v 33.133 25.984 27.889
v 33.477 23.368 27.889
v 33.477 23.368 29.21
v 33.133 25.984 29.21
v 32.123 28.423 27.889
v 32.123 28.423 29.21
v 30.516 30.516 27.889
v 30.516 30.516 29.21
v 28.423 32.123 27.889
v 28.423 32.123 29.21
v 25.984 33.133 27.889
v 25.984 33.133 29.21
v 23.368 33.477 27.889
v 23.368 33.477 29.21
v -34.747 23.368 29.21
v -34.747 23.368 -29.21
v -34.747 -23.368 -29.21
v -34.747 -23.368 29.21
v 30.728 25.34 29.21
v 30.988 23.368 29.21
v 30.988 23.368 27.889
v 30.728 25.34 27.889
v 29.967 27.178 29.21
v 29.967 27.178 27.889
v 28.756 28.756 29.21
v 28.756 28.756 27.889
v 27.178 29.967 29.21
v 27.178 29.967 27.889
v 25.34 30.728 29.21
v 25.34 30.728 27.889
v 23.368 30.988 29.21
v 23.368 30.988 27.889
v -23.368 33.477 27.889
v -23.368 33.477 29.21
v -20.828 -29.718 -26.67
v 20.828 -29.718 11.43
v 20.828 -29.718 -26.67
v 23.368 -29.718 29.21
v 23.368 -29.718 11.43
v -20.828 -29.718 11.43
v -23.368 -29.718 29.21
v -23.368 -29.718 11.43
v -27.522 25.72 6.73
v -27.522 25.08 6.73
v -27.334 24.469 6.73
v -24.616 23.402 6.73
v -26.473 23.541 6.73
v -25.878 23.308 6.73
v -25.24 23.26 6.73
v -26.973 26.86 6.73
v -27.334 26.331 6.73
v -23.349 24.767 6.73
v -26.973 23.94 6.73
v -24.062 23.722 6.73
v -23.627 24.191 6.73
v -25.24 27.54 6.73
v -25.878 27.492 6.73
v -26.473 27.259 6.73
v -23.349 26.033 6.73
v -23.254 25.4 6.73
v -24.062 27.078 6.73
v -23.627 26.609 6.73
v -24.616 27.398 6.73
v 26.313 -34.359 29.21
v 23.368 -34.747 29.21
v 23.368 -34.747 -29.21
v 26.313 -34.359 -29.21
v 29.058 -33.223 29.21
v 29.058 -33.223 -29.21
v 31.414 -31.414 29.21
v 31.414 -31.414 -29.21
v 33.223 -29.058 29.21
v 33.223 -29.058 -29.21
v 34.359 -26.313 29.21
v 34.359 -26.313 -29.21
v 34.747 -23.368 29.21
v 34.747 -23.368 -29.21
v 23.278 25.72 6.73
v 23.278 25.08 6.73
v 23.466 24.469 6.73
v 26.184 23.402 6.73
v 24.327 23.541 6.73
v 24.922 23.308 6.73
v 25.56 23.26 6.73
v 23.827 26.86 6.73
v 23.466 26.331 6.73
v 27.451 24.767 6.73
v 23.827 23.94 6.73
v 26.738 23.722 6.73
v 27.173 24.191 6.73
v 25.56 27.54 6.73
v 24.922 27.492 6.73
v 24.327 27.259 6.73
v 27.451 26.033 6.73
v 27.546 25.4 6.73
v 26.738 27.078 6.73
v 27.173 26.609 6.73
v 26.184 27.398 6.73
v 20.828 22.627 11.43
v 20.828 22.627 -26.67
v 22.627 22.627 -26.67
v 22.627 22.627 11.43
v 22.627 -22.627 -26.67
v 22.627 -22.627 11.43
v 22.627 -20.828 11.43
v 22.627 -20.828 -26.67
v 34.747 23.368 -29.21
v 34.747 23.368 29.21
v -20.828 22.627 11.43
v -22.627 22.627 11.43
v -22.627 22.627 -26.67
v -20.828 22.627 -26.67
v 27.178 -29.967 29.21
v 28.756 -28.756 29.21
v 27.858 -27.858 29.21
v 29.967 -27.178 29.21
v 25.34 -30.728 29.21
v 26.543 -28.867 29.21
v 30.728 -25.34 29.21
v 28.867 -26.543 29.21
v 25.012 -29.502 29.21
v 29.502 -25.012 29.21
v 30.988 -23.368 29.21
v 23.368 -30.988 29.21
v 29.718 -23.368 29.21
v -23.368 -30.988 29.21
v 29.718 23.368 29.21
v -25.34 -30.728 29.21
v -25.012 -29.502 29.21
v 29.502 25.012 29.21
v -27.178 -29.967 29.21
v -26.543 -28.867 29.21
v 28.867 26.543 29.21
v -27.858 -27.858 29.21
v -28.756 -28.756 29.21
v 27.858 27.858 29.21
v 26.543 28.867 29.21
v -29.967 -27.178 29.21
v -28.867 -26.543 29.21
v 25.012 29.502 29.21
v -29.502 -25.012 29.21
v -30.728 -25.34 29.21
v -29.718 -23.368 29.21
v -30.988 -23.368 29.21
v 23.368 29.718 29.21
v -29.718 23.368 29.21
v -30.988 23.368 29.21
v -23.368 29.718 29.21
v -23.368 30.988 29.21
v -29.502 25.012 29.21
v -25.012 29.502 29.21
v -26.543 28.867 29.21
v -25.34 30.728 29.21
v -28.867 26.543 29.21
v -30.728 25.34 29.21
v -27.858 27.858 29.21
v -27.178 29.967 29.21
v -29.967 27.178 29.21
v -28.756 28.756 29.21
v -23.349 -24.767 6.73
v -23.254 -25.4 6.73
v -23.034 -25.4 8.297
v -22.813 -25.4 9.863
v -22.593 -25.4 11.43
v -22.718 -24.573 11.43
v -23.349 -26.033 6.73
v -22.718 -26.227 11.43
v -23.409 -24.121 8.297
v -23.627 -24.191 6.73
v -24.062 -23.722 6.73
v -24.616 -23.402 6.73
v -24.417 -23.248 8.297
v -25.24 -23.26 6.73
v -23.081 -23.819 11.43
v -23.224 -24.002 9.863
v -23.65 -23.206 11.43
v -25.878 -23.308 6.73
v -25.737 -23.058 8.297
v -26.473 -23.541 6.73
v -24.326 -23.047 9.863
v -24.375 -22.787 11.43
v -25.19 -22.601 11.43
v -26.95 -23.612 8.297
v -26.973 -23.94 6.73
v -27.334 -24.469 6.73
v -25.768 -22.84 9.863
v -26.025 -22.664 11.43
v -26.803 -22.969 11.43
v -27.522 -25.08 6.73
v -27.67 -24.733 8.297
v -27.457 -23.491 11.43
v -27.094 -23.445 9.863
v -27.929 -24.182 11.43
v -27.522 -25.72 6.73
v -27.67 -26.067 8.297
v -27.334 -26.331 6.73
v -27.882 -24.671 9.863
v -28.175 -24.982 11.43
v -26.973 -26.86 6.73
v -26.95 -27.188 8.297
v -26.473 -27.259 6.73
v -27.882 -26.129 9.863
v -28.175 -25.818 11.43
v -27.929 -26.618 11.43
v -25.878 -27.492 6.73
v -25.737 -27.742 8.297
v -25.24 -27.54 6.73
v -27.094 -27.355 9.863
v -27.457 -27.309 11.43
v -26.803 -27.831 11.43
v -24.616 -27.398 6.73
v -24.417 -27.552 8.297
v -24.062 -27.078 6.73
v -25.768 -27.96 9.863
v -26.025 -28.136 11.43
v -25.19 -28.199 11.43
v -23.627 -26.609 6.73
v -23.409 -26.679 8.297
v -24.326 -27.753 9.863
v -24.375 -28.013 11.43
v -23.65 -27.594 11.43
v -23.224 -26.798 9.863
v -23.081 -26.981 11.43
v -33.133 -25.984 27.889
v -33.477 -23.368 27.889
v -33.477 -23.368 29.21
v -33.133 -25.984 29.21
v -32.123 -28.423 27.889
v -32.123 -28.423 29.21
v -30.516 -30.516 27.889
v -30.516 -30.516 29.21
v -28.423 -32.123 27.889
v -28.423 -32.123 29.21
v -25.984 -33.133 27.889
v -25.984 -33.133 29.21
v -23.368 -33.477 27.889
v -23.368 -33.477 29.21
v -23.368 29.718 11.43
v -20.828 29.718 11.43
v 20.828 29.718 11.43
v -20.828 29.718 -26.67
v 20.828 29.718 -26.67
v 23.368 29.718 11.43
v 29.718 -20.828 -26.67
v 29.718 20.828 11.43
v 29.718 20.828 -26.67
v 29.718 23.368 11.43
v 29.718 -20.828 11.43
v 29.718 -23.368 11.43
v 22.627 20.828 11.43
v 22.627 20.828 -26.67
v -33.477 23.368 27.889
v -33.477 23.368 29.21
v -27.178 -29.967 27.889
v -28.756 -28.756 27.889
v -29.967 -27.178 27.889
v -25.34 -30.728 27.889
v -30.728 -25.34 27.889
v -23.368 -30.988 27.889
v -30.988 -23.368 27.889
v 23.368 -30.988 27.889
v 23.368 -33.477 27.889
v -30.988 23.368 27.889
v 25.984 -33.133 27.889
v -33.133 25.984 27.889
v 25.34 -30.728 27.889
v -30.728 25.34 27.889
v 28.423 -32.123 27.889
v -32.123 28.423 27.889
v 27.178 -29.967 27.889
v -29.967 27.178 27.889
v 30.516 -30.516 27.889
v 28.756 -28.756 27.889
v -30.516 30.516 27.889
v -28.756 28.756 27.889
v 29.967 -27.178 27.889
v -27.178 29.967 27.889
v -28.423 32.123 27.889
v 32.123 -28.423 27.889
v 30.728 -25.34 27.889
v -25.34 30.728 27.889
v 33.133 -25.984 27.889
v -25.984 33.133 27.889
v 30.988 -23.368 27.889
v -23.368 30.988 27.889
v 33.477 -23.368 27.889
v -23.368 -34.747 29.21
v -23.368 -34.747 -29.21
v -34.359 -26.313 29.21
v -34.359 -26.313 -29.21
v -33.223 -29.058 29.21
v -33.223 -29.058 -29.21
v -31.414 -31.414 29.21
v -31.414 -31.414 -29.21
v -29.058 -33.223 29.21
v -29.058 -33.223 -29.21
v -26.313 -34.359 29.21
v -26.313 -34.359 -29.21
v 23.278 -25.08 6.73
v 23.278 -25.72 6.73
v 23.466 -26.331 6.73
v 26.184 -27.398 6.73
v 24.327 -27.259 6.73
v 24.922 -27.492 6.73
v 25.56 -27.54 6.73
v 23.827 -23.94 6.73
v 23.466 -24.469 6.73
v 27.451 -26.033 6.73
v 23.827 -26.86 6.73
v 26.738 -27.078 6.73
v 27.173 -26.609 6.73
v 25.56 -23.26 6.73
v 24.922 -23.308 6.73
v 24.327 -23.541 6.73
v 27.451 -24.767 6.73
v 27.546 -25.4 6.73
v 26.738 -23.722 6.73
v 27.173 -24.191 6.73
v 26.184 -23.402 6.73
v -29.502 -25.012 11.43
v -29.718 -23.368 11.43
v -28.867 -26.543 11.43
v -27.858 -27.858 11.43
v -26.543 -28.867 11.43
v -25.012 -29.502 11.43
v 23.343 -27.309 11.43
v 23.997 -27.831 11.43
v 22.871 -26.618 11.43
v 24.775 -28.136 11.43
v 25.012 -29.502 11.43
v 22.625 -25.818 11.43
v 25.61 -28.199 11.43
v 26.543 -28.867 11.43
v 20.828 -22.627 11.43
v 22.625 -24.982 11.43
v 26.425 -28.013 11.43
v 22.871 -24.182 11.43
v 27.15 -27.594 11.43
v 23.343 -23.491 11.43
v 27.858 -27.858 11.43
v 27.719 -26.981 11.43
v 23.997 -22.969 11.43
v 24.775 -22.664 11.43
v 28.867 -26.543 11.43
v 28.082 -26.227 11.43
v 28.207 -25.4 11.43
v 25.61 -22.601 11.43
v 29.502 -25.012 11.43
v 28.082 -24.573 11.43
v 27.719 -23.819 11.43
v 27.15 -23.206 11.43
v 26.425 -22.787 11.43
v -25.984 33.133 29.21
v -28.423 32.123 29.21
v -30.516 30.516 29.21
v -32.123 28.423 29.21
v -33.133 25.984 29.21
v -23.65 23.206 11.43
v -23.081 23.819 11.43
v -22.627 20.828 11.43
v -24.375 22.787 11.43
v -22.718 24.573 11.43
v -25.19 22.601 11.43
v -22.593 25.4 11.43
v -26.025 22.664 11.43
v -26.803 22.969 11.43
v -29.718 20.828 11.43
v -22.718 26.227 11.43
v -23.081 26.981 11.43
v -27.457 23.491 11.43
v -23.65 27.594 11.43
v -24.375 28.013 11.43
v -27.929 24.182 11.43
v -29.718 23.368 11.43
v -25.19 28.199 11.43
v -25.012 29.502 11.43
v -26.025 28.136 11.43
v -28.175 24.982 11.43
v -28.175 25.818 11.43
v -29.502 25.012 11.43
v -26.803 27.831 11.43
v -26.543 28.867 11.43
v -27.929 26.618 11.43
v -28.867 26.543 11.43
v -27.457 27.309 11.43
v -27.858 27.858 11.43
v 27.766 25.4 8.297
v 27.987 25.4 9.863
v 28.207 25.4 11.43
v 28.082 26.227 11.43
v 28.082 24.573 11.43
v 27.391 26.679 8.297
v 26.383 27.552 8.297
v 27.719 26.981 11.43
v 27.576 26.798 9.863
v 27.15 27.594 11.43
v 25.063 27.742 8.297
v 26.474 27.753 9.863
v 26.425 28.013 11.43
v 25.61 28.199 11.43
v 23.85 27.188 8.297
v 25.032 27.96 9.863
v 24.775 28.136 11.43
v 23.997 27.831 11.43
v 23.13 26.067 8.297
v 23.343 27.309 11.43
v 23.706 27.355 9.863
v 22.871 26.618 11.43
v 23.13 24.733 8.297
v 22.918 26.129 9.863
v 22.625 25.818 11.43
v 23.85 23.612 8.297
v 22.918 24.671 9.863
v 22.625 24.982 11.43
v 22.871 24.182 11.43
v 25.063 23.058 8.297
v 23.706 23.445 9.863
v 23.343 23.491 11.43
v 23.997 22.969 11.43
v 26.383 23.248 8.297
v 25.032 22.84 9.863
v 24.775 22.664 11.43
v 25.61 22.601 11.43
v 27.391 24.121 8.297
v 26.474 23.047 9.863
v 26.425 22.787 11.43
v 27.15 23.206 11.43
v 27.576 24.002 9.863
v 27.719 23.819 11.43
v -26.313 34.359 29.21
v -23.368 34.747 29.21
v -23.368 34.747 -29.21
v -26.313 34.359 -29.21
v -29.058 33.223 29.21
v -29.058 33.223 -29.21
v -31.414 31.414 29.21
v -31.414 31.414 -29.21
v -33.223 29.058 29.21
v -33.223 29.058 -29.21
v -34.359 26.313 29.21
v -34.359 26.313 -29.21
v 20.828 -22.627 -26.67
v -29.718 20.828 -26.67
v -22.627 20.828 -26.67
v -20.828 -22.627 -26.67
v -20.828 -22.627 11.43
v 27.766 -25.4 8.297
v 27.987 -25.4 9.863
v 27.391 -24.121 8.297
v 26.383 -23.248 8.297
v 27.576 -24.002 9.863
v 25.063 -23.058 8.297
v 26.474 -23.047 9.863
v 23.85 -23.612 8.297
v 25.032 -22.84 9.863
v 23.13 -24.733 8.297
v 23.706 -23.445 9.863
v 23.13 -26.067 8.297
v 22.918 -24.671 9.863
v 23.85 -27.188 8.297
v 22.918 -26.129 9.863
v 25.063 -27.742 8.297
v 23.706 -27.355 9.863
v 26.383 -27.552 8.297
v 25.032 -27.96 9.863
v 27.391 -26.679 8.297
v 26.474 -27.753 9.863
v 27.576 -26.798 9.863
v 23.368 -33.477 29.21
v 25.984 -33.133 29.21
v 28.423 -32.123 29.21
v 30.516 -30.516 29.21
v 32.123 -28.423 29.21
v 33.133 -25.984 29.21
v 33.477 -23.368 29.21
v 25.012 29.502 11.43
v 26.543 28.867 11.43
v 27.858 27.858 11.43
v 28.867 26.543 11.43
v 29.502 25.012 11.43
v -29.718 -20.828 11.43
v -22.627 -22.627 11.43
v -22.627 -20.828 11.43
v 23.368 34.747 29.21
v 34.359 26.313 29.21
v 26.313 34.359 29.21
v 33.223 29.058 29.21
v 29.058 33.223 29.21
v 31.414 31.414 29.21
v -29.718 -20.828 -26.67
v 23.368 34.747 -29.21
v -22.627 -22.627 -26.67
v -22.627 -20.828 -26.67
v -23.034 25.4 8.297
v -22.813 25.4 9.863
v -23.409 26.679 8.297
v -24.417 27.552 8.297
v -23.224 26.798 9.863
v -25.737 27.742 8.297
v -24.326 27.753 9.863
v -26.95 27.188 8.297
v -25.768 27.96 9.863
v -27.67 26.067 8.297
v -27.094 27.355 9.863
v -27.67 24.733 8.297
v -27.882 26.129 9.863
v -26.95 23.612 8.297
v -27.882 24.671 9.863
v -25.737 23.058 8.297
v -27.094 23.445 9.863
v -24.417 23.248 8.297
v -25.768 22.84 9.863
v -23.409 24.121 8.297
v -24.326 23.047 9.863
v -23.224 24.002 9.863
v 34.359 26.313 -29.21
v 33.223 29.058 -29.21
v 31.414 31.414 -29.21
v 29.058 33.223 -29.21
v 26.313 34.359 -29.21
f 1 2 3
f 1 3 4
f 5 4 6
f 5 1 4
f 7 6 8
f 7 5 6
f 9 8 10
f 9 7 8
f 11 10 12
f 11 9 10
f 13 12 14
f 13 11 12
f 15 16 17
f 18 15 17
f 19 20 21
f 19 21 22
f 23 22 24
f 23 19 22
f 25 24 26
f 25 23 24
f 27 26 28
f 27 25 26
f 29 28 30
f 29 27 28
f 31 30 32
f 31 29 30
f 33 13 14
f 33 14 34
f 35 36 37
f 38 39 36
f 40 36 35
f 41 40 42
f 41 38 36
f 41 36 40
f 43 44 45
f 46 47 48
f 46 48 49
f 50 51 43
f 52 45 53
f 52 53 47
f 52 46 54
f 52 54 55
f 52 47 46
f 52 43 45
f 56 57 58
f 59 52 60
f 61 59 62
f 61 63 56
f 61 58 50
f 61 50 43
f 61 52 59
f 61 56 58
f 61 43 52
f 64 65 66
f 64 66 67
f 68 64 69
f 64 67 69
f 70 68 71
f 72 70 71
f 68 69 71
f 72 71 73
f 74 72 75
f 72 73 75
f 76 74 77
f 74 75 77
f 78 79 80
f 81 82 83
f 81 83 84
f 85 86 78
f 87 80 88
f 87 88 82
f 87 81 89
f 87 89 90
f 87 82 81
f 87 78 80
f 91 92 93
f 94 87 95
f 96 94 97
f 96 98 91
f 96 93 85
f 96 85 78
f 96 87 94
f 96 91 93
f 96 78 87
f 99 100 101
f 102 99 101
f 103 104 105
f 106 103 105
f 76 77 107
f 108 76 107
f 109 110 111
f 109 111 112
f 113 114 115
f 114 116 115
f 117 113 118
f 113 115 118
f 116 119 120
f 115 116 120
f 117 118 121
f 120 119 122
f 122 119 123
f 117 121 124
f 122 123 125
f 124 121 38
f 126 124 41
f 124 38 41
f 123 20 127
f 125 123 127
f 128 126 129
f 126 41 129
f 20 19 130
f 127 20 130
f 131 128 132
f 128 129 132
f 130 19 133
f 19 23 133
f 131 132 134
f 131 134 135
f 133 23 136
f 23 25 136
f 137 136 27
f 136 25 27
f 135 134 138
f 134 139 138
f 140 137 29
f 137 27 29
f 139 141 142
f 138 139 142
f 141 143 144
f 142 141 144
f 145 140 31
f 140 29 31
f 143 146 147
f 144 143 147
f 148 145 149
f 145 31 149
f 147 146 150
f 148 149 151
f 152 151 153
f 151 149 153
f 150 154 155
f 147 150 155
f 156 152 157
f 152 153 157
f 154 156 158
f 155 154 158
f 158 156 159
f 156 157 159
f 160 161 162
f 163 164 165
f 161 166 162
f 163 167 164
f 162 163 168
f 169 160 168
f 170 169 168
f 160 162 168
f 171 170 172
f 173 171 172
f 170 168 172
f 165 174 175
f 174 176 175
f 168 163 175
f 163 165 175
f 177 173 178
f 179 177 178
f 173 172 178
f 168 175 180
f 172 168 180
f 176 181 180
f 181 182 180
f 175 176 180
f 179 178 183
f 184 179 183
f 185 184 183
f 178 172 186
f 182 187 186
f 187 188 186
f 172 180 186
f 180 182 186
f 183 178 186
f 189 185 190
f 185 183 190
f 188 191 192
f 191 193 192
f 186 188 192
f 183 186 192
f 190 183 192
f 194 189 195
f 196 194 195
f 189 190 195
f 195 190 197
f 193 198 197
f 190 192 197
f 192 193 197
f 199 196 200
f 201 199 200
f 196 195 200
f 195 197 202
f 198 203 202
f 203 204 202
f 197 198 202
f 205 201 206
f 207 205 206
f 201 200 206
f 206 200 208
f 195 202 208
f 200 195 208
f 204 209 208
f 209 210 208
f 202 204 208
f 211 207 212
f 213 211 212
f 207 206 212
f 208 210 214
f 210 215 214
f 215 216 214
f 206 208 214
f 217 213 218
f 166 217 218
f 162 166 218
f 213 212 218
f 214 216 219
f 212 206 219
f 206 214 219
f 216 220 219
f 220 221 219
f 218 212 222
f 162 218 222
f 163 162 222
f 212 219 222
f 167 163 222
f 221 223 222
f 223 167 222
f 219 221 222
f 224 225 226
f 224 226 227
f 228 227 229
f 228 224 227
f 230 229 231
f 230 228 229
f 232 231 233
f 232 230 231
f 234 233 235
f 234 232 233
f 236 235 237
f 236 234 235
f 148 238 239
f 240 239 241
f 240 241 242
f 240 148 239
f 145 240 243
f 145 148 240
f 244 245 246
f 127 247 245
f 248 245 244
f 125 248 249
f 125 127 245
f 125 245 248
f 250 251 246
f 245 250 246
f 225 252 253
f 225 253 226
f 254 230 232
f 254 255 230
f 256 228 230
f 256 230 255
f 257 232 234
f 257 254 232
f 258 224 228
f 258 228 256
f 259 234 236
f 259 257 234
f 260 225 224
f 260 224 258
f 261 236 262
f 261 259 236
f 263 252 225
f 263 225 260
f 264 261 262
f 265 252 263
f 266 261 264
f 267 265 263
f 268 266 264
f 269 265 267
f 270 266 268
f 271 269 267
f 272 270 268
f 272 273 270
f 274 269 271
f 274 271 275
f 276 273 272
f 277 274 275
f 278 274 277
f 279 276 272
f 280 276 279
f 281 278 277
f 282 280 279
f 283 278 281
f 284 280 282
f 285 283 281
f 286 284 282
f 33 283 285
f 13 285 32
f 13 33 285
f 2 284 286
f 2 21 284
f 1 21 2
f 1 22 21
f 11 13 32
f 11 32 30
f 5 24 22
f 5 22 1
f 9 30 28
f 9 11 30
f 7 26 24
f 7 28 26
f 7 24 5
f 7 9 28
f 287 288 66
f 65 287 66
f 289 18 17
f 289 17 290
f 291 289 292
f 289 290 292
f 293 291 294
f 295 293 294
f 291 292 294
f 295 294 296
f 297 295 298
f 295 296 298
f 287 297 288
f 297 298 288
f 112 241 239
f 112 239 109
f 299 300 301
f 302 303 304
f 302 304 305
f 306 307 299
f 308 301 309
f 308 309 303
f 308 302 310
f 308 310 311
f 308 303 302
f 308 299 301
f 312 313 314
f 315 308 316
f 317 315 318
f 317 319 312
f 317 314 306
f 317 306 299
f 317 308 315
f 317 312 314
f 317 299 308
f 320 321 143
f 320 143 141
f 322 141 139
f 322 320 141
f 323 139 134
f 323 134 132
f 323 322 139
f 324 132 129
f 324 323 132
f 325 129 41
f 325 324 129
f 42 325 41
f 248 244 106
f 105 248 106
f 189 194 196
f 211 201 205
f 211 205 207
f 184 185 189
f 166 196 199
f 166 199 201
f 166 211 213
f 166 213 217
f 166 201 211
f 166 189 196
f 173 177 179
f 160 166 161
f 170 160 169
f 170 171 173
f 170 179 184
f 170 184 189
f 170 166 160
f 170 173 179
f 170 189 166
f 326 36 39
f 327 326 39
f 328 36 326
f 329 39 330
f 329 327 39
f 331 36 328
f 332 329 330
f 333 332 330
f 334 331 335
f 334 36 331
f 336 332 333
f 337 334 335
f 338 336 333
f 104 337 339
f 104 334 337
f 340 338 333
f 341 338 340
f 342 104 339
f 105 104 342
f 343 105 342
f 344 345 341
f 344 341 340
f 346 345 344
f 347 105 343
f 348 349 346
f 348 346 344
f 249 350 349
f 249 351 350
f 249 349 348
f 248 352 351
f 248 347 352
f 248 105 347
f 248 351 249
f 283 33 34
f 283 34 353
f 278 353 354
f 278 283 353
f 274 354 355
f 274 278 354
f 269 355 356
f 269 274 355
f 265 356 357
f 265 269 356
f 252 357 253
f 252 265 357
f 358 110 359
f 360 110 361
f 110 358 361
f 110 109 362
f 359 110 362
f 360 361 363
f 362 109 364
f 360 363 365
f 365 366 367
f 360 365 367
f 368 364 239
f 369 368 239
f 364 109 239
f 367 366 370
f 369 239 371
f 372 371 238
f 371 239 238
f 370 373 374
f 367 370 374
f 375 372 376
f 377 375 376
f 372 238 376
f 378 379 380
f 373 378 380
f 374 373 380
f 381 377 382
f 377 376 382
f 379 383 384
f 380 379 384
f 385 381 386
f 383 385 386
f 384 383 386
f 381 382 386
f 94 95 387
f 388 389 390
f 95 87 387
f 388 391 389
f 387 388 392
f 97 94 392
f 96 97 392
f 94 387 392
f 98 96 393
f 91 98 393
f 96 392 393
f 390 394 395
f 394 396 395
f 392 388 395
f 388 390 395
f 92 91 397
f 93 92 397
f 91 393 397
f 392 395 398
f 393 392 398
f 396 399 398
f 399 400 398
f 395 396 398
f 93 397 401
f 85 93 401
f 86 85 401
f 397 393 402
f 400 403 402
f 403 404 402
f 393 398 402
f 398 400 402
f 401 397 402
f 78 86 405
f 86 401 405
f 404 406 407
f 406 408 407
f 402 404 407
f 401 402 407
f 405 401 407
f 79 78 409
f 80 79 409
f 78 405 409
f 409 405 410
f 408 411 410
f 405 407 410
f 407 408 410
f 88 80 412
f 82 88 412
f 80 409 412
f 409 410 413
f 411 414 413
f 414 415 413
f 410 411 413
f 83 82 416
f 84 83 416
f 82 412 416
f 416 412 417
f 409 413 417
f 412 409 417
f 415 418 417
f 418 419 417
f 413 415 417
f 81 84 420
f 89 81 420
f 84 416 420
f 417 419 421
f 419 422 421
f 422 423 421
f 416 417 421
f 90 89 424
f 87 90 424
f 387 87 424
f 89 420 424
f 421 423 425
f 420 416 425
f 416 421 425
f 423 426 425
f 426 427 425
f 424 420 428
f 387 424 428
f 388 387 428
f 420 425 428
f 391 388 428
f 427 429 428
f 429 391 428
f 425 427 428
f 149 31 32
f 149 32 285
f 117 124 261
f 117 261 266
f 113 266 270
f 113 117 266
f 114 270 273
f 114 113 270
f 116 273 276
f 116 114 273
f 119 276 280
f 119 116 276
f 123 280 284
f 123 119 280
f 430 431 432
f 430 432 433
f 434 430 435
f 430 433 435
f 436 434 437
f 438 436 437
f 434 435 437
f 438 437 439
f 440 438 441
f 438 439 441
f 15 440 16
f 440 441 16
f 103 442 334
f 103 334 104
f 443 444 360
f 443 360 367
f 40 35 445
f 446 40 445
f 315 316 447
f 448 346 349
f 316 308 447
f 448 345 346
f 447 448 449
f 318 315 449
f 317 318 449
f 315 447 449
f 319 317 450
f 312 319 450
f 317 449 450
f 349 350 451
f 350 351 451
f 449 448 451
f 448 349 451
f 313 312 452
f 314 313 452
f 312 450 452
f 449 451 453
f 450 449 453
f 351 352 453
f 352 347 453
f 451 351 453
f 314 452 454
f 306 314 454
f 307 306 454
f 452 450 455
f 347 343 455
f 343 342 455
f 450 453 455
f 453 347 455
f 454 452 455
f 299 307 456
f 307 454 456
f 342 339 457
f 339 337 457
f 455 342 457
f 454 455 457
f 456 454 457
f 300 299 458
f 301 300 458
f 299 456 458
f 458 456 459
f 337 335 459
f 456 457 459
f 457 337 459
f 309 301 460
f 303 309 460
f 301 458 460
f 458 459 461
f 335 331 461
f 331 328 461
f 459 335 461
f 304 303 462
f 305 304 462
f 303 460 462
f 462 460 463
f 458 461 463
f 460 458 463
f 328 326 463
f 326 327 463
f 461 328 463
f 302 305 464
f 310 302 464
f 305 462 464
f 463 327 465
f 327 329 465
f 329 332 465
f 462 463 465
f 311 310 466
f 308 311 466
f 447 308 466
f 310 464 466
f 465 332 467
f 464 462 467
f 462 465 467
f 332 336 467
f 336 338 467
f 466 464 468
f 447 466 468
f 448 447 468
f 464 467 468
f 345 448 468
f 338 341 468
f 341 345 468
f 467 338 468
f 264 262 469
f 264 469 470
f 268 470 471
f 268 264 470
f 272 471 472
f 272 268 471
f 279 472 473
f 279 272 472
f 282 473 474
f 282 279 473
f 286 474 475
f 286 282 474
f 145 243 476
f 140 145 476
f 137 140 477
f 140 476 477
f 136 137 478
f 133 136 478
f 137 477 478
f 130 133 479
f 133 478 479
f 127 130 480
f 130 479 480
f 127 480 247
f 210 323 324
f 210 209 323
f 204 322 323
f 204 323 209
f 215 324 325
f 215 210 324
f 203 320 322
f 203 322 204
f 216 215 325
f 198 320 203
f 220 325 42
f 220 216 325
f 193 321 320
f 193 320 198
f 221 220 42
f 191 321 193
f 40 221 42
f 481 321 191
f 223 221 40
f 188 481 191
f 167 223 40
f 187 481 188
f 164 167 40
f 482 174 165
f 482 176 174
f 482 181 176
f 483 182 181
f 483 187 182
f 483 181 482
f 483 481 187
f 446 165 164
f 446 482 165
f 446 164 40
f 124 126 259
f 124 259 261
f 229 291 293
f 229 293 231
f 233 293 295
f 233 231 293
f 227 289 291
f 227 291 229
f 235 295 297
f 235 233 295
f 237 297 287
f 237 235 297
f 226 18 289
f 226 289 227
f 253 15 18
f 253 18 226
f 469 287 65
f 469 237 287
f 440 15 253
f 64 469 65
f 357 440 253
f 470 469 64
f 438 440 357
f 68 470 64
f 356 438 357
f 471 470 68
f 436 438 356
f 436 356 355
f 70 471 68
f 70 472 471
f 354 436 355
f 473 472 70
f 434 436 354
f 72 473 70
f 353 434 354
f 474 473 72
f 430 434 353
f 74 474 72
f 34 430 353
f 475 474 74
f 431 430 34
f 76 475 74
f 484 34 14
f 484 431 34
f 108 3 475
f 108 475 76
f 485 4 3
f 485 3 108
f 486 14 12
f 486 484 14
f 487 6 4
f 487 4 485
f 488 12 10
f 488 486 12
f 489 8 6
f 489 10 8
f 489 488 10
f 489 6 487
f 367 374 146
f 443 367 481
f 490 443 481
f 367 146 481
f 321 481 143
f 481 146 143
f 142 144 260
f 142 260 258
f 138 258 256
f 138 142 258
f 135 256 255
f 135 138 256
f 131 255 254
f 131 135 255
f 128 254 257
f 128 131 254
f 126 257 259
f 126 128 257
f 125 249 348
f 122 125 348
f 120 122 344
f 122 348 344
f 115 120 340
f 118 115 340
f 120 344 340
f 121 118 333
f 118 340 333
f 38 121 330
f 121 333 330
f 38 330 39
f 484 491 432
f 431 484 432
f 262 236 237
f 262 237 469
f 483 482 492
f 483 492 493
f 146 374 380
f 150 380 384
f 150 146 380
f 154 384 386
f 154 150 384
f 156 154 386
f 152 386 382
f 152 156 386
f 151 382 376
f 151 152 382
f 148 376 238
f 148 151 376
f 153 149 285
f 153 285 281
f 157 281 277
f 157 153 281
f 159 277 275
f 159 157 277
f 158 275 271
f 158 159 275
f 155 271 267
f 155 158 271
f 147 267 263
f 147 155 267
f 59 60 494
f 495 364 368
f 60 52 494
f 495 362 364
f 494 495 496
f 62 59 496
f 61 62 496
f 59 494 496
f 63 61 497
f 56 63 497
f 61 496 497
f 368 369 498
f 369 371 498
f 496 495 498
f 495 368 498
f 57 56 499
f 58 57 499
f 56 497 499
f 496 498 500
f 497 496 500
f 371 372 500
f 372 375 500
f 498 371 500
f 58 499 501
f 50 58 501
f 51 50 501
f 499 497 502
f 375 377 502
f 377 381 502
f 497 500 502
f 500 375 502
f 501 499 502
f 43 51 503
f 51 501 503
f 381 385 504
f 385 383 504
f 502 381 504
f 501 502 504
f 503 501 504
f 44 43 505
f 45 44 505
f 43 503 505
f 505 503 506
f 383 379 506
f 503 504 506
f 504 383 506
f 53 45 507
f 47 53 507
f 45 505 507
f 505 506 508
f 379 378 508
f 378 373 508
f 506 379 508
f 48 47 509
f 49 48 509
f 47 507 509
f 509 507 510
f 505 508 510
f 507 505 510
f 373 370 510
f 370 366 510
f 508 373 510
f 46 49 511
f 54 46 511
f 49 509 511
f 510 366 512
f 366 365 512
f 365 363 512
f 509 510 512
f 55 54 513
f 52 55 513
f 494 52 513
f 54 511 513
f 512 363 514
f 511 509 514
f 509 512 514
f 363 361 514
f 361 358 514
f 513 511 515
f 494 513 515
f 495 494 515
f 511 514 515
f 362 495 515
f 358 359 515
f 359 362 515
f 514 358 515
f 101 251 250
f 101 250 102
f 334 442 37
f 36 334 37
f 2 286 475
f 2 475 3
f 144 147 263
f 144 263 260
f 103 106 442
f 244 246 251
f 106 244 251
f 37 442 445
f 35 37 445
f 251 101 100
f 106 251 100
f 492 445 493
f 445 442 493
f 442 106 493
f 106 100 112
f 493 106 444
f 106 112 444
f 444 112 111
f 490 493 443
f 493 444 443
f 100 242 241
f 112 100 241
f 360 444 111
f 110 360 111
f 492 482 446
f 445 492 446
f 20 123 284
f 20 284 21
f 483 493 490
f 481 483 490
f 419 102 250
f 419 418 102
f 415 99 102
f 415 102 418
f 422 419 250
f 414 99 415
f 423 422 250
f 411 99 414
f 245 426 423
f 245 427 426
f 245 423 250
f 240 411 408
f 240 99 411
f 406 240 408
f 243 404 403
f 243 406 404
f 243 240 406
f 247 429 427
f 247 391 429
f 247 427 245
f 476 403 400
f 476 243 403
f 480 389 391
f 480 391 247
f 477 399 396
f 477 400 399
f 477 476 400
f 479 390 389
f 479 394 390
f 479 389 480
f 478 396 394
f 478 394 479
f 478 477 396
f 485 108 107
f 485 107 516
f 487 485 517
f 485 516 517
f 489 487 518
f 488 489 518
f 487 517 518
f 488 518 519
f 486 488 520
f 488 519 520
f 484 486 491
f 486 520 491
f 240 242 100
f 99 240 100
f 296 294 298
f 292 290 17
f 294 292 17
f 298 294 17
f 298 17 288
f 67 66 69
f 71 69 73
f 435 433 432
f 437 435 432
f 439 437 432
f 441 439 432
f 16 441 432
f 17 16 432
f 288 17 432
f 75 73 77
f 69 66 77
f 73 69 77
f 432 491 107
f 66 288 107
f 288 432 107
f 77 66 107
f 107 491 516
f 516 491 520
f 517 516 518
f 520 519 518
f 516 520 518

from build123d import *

# Parameters (mm, degrees)
BOSS_EXTRUDE1_DEPTH          = 29.21
SHELL1_T                     = -2.54
FILLET1_R                    = 6.35
BOSS_EXTRUDE2_DEPTH          = 38.1
SKETCH3_R                    = 2.8067
CUT_EXTRUDE1_DEPTH           = 4.7
CUT_EXTRUDE1_DRAFT           = -8
CUT_EXTRUDE1_PROFILE_2_DEPTH = 4.7
CUT_EXTRUDE1_PROFILE_2_DRAFT = -8
CUT_EXTRUDE1_PROFILE_3_DEPTH = 4.7
CUT_EXTRUDE1_PROFILE_3_DRAFT = -8
CUT_EXTRUDE1_PROFILE_4_DEPTH = 4.7
CUT_EXTRUDE1_PROFILE_4_DRAFT = -8
SKETCH5_W                    = 45.253999916
SKETCH5_H                    = 45.253999916
CUT_EXTRUDE5_DEPTH           = 38.1
SKETCH6_OUTSIDE_W            = 88.184
SKETCH6_OUTSIDE_H            = 88.184
CUT_EXTRUDE6_DEPTH           = 1.3208
BOSS_EXTRUDE3_START          = -2.54
BOSS_EXTRUDE3_DEPTH          = 57.0992
BOSS_EXTRUDE7_START          = -57.0992
BOSS_EXTRUDE7_DEPTH          = 58.42


with BuildPart() as part:
    # Sketch1 → Boss-Extrude1 (new, symmetric)
    with BuildSketch(Plane.XY):
        Polygon((-32.258, -32.258), (-32.258, -11.938), (-32.258, 11.938), (-32.258, 32.258), (32.258, 32.258), (32.258, -32.258), align=None)
    extrude(amount=BOSS_EXTRUDE1_DEPTH, both=True)

    # Shell1
    shell1_openings = [part.faces().sort_by_distance(p)[0] for p in [
        (0, 0, 29.21),
    ]]
    offset(amount=SHELL1_T, openings=shell1_openings, kind=Kind.INTERSECTION)

    # Fillet1
    fillet1_edges = [part.edges().sort_by_distance(p)[0] for p in [
        (-32.258, -32.258, 0),
        (-32.258, 32.258, 0),
        (32.258, 32.258, 0),
        (32.258, -32.258, 0),
        (-29.718, -29.718, 1.27),
        (29.718, -29.718, 1.27),
        (29.718, 29.718, 1.27),
        (-29.718, 29.718, 1.27),
    ]]
    fillet(fillet1_edges, radius=FILLET1_R)

    # Sketch2 → Boss-Extrude2 (add)
    with BuildSketch(Plane.XY.offset(-26.67)):
        with BuildLine():
            Line((-20.828, -20.828), (-29.718, -20.828))
            Line((-29.718, -20.828), (-29.718, -23.368))
            ThreePointArc((-29.718, -23.368), (-27.858128061, -27.858128061), (-23.368, -29.718))
            Line((-23.368, -29.718), (-20.828, -29.718))
            Line((-20.828, -29.718), (-20.828, -20.828))
        make_face()
        with BuildLine():
            ThreePointArc((-29.718, 23.368), (-27.858128061, 27.858128061), (-23.368, 29.718))
            Line((-23.368, 29.718), (-20.828, 29.718))
            Line((-20.828, 29.718), (-20.828, 20.828))
            Line((-20.828, 20.828), (-29.718, 20.828))
            Line((-29.718, 20.828), (-29.718, 23.368))
        make_face()
        with BuildLine():
            ThreePointArc((29.718, 23.368), (27.858128061, 27.858128061), (23.368, 29.718))
            Line((23.368, 29.718), (20.828, 29.718))
            Line((20.828, 29.718), (20.828, 20.828))
            Line((20.828, 20.828), (29.718, 20.828))
            Line((29.718, 20.828), (29.718, 23.368))
        make_face()
        with BuildLine():
            ThreePointArc((23.368, -29.718), (27.858128061, -27.858128061), (29.718, -23.368))
            Line((29.718, -23.368), (29.718, -20.828))
            Line((29.718, -20.828), (20.828, -20.828))
            Line((20.828, -20.828), (20.828, -29.718))
            Line((20.828, -29.718), (23.368, -29.718))
        make_face()
    extrude(amount=BOSS_EXTRUDE2_DEPTH)


with BuildPart() as cut_extrude1_tool:
    # Sketch3 → Cut-Extrude1 (with draft: the straight prism first)
    with BuildSketch(Plane.XY.offset(11.43)):
        with Locations((-25.4, -25.4)):
            Circle(SKETCH3_R)
    extrude(amount=-CUT_EXTRUDE1_DEPTH)
    # Cut-Extrude1: the draft: its side faces are tilted about the plane it starts from
    cut_extrude1_sides = [cut_extrude1_tool.faces().sort_by_distance(p)[0] for p in [
        (-28.2067, -25.4, 9.08),
    ]]
    draft(cut_extrude1_sides, Plane.XY.offset(11.43), CUT_EXTRUDE1_DRAFT)


with BuildPart() as part_1:
    add(part.part)

    # Cut-Extrude1: cut by cut_extrude1_tool
    add(cut_extrude1_tool.part, mode=Mode.SUBTRACT)


with BuildPart() as cut_extrude1_profile_2_tool:
    # Sketch3 → Cut-Extrude1 profile 2 (with draft: the straight prism first)
    with BuildSketch(Plane.XY.offset(11.43)):
        with Locations((-25.4, 25.4)):
            Circle(SKETCH3_R)
    extrude(amount=-CUT_EXTRUDE1_PROFILE_2_DEPTH)
    # Cut-Extrude1 profile 2: the draft: its side faces are tilted about the plane it starts from
    cut_extrude1_profile_2_sides = [cut_extrude1_profile_2_tool.faces().sort_by_distance(p)[0] for p in [
        (-28.2067, 25.4, 9.08),
    ]]
    draft(cut_extrude1_profile_2_sides, Plane.XY.offset(11.43), CUT_EXTRUDE1_PROFILE_2_DRAFT)


with BuildPart() as part_2:
    add(part_1.part)

    # Cut-Extrude1 profile 2: cut by cut_extrude1_profile_2_tool
    add(cut_extrude1_profile_2_tool.part, mode=Mode.SUBTRACT)


with BuildPart() as cut_extrude1_profile_3_tool:
    # Sketch3 → Cut-Extrude1 profile 3 (with draft: the straight prism first)
    with BuildSketch(Plane.XY.offset(11.43)):
        with Locations((25.4, 25.4)):
            Circle(SKETCH3_R)
    extrude(amount=-CUT_EXTRUDE1_PROFILE_3_DEPTH)
    # Cut-Extrude1 profile 3: the draft: its side faces are tilted about the plane it starts from
    cut_extrude1_profile_3_sides = [cut_extrude1_profile_3_tool.faces().sort_by_distance(p)[0] for p in [
        (22.5933, 25.4, 9.08),
    ]]
    draft(cut_extrude1_profile_3_sides, Plane.XY.offset(11.43), CUT_EXTRUDE1_PROFILE_3_DRAFT)


with BuildPart() as part_3:
    add(part_2.part)

    # Cut-Extrude1 profile 3: cut by cut_extrude1_profile_3_tool
    add(cut_extrude1_profile_3_tool.part, mode=Mode.SUBTRACT)


with BuildPart() as cut_extrude1_profile_4_tool:
    # Sketch3 → Cut-Extrude1 profile 4 (with draft: the straight prism first)
    with BuildSketch(Plane.XY.offset(11.43)):
        with Locations((25.4, -25.4)):
            Circle(SKETCH3_R)
    extrude(amount=-CUT_EXTRUDE1_PROFILE_4_DEPTH)
    # Cut-Extrude1 profile 4: the draft: its side faces are tilted about the plane it starts from
    cut_extrude1_profile_4_sides = [cut_extrude1_profile_4_tool.faces().sort_by_distance(p)[0] for p in [
        (22.5933, -25.4, 9.08),
    ]]
    draft(cut_extrude1_profile_4_sides, Plane.XY.offset(11.43), CUT_EXTRUDE1_PROFILE_4_DRAFT)


with BuildPart() as part_4:
    add(part_3.part)

    # Cut-Extrude1 profile 4: cut by cut_extrude1_profile_4_tool
    add(cut_extrude1_profile_4_tool.part, mode=Mode.SUBTRACT)

    # Sketch5 → Cut-Extrude5 (cut)
    with BuildSketch(Plane.XY.offset(11.43)):
        Rectangle(SKETCH5_W, SKETCH5_H)
    extrude(amount=-CUT_EXTRUDE5_DEPTH, mode=Mode.SUBTRACT)

    # Sketch6 outside → Cut-Extrude6 (cut)
    # profile 1 of 2: a face of its own
    with BuildSketch(Plane.XY.offset(29.21)):
        Rectangle(SKETCH6_OUTSIDE_W, SKETCH6_OUTSIDE_H)
        with BuildLine():
            Line((23.368, 30.988), (20.828, 30.988))
            Line((20.828, 30.988), (-20.828, 30.988))
            Line((-20.828, 30.988), (-23.368, 30.988))
            ThreePointArc((-23.368, 30.988), (-28.756153673, 28.756153673), (-30.988, 23.368))
            Line((-30.988, 23.368), (-30.988, -23.368))
            ThreePointArc((-30.988, -23.368), (-28.756153673, -28.756153673), (-23.368, -30.988))
            Line((-23.368, -30.988), (-20.828, -30.988))
            Line((-20.828, -30.988), (20.828, -30.988))
            Line((20.828, -30.988), (23.368, -30.988))
            ThreePointArc((23.368, -30.988), (28.756153673, -28.756153673), (30.988, -23.368))
            Line((30.988, -23.368), (30.988, 23.368))
            ThreePointArc((30.988, 23.368), (28.756153673, 28.756153673), (23.368, 30.988))
        make_face(mode=Mode.SUBTRACT)
    # profile 2 of 2: a face of its own
    with BuildSketch(Plane.XY.offset(29.21)):
        with BuildLine():
            Line((23.368, 29.718), (20.828, 29.718))
            Line((20.828, 29.718), (-20.828, 29.718))
            Line((-20.828, 29.718), (-23.368, 29.718))
            ThreePointArc((-23.368, 29.718), (-27.858128061, 27.858128061), (-29.718, 23.368))
            Line((-29.718, 23.368), (-29.718, -23.368))
            ThreePointArc((-29.718, -23.368), (-27.858128061, -27.858128061), (-23.368, -29.718))
            Line((-23.368, -29.718), (-20.828, -29.718))
            Line((-20.828, -29.718), (20.828, -29.718))
            Line((20.828, -29.718), (23.368, -29.718))
            ThreePointArc((23.368, -29.718), (27.858128061, -27.858128061), (29.718, -23.368))
            Line((29.718, -23.368), (29.718, 23.368))
            ThreePointArc((29.718, 23.368), (27.858128061, 27.858128061), (23.368, 29.718))
        make_face()
    extrude(amount=-CUT_EXTRUDE6_DEPTH, mode=Mode.SUBTRACT)

    # Sketch7 → Boss-Extrude3 (add)
    with BuildSketch(Plane.XY.offset(-26.67).offset(BOSS_EXTRUDE3_START)):
        with BuildLine():
            Line((33.4772, -23.368), (33.4772, 23.368))
            ThreePointArc((33.4772, 23.368), (30.516283872, 30.516283872), (23.368, 33.4772))
            Line((23.368, 33.4772), (-23.368, 33.4772))
            ThreePointArc((-23.368, 33.4772), (-30.516283872, 30.516283872), (-33.4772, 23.368))
            Line((-33.4772, 23.368), (-33.4772, -23.368))
            ThreePointArc((-33.4772, -23.368), (-30.516283872, -30.516283872), (-23.368, -33.4772))
            Line((-23.368, -33.4772), (23.368, -33.4772))
            ThreePointArc((23.368, -33.4772), (30.516283872, -30.516283872), (33.4772, -23.368))
        make_face()
        with BuildLine():
            Line((23.368, 32.2072), (-23.368, 32.2072))
            ThreePointArc((-23.368, 32.2072), (-29.61825826, 29.61825826), (-32.2072, 23.368))
            Line((-32.2072, 23.368), (-32.2072, -23.368))
            ThreePointArc((-32.2072, -23.368), (-29.61825826, -29.61825826), (-23.368, -32.2072))
            Line((-23.368, -32.2072), (23.368, -32.2072))
            ThreePointArc((23.368, -32.2072), (29.61825826, -29.61825826), (32.2072, -23.368))
            Line((32.2072, -23.368), (32.2072, 23.368))
            ThreePointArc((32.2072, 23.368), (29.61825826, 29.61825826), (23.368, 32.2072))
        make_face(mode=Mode.SUBTRACT)
    extrude(amount=BOSS_EXTRUDE3_DEPTH)

    # Sketch9 → Boss-Extrude7 (add)
    with BuildSketch(Plane.XY.offset(27.8892).offset(BOSS_EXTRUDE7_START)):
        with BuildLine():
            Line((34.7472, -23.368), (34.7472, 23.368))
            ThreePointArc((34.7472, 23.368), (31.414309484, 31.414309484), (23.368, 34.7472))
            Line((23.368, 34.7472), (-23.368, 34.7472))
            ThreePointArc((-23.368, 34.7472), (-31.414309484, 31.414309484), (-34.7472, 23.368))
            Line((-34.7472, 23.368), (-34.7472, -23.368))
            ThreePointArc((-34.7472, -23.368), (-31.414309484, -31.414309484), (-23.368, -34.7472))
            Line((-23.368, -34.7472), (23.368, -34.7472))
            ThreePointArc((23.368, -34.7472), (31.414309484, -31.414309484), (34.7472, -23.368))
        make_face()
        with BuildLine():
            Line((23.368, 33.4772), (-23.368, 33.4772))
            ThreePointArc((-23.368, 33.4772), (-30.516283872, 30.516283872), (-33.4772, 23.368))
            Line((-33.4772, 23.368), (-33.4772, -23.368))
            ThreePointArc((-33.4772, -23.368), (-30.516283872, -30.516283872), (-23.368, -33.4772))
            Line((-23.368, -33.4772), (23.368, -33.4772))
            ThreePointArc((23.368, -33.4772), (30.516283872, -30.516283872), (33.4772, -23.368))
            Line((33.4772, -23.368), (33.4772, 23.368))
            ThreePointArc((33.4772, 23.368), (30.516283872, 30.516283872), (23.368, 33.4772))
        make_face(mode=Mode.SUBTRACT)
    extrude(amount=BOSS_EXTRUDE7_DEPTH)


solid = part_4.part
